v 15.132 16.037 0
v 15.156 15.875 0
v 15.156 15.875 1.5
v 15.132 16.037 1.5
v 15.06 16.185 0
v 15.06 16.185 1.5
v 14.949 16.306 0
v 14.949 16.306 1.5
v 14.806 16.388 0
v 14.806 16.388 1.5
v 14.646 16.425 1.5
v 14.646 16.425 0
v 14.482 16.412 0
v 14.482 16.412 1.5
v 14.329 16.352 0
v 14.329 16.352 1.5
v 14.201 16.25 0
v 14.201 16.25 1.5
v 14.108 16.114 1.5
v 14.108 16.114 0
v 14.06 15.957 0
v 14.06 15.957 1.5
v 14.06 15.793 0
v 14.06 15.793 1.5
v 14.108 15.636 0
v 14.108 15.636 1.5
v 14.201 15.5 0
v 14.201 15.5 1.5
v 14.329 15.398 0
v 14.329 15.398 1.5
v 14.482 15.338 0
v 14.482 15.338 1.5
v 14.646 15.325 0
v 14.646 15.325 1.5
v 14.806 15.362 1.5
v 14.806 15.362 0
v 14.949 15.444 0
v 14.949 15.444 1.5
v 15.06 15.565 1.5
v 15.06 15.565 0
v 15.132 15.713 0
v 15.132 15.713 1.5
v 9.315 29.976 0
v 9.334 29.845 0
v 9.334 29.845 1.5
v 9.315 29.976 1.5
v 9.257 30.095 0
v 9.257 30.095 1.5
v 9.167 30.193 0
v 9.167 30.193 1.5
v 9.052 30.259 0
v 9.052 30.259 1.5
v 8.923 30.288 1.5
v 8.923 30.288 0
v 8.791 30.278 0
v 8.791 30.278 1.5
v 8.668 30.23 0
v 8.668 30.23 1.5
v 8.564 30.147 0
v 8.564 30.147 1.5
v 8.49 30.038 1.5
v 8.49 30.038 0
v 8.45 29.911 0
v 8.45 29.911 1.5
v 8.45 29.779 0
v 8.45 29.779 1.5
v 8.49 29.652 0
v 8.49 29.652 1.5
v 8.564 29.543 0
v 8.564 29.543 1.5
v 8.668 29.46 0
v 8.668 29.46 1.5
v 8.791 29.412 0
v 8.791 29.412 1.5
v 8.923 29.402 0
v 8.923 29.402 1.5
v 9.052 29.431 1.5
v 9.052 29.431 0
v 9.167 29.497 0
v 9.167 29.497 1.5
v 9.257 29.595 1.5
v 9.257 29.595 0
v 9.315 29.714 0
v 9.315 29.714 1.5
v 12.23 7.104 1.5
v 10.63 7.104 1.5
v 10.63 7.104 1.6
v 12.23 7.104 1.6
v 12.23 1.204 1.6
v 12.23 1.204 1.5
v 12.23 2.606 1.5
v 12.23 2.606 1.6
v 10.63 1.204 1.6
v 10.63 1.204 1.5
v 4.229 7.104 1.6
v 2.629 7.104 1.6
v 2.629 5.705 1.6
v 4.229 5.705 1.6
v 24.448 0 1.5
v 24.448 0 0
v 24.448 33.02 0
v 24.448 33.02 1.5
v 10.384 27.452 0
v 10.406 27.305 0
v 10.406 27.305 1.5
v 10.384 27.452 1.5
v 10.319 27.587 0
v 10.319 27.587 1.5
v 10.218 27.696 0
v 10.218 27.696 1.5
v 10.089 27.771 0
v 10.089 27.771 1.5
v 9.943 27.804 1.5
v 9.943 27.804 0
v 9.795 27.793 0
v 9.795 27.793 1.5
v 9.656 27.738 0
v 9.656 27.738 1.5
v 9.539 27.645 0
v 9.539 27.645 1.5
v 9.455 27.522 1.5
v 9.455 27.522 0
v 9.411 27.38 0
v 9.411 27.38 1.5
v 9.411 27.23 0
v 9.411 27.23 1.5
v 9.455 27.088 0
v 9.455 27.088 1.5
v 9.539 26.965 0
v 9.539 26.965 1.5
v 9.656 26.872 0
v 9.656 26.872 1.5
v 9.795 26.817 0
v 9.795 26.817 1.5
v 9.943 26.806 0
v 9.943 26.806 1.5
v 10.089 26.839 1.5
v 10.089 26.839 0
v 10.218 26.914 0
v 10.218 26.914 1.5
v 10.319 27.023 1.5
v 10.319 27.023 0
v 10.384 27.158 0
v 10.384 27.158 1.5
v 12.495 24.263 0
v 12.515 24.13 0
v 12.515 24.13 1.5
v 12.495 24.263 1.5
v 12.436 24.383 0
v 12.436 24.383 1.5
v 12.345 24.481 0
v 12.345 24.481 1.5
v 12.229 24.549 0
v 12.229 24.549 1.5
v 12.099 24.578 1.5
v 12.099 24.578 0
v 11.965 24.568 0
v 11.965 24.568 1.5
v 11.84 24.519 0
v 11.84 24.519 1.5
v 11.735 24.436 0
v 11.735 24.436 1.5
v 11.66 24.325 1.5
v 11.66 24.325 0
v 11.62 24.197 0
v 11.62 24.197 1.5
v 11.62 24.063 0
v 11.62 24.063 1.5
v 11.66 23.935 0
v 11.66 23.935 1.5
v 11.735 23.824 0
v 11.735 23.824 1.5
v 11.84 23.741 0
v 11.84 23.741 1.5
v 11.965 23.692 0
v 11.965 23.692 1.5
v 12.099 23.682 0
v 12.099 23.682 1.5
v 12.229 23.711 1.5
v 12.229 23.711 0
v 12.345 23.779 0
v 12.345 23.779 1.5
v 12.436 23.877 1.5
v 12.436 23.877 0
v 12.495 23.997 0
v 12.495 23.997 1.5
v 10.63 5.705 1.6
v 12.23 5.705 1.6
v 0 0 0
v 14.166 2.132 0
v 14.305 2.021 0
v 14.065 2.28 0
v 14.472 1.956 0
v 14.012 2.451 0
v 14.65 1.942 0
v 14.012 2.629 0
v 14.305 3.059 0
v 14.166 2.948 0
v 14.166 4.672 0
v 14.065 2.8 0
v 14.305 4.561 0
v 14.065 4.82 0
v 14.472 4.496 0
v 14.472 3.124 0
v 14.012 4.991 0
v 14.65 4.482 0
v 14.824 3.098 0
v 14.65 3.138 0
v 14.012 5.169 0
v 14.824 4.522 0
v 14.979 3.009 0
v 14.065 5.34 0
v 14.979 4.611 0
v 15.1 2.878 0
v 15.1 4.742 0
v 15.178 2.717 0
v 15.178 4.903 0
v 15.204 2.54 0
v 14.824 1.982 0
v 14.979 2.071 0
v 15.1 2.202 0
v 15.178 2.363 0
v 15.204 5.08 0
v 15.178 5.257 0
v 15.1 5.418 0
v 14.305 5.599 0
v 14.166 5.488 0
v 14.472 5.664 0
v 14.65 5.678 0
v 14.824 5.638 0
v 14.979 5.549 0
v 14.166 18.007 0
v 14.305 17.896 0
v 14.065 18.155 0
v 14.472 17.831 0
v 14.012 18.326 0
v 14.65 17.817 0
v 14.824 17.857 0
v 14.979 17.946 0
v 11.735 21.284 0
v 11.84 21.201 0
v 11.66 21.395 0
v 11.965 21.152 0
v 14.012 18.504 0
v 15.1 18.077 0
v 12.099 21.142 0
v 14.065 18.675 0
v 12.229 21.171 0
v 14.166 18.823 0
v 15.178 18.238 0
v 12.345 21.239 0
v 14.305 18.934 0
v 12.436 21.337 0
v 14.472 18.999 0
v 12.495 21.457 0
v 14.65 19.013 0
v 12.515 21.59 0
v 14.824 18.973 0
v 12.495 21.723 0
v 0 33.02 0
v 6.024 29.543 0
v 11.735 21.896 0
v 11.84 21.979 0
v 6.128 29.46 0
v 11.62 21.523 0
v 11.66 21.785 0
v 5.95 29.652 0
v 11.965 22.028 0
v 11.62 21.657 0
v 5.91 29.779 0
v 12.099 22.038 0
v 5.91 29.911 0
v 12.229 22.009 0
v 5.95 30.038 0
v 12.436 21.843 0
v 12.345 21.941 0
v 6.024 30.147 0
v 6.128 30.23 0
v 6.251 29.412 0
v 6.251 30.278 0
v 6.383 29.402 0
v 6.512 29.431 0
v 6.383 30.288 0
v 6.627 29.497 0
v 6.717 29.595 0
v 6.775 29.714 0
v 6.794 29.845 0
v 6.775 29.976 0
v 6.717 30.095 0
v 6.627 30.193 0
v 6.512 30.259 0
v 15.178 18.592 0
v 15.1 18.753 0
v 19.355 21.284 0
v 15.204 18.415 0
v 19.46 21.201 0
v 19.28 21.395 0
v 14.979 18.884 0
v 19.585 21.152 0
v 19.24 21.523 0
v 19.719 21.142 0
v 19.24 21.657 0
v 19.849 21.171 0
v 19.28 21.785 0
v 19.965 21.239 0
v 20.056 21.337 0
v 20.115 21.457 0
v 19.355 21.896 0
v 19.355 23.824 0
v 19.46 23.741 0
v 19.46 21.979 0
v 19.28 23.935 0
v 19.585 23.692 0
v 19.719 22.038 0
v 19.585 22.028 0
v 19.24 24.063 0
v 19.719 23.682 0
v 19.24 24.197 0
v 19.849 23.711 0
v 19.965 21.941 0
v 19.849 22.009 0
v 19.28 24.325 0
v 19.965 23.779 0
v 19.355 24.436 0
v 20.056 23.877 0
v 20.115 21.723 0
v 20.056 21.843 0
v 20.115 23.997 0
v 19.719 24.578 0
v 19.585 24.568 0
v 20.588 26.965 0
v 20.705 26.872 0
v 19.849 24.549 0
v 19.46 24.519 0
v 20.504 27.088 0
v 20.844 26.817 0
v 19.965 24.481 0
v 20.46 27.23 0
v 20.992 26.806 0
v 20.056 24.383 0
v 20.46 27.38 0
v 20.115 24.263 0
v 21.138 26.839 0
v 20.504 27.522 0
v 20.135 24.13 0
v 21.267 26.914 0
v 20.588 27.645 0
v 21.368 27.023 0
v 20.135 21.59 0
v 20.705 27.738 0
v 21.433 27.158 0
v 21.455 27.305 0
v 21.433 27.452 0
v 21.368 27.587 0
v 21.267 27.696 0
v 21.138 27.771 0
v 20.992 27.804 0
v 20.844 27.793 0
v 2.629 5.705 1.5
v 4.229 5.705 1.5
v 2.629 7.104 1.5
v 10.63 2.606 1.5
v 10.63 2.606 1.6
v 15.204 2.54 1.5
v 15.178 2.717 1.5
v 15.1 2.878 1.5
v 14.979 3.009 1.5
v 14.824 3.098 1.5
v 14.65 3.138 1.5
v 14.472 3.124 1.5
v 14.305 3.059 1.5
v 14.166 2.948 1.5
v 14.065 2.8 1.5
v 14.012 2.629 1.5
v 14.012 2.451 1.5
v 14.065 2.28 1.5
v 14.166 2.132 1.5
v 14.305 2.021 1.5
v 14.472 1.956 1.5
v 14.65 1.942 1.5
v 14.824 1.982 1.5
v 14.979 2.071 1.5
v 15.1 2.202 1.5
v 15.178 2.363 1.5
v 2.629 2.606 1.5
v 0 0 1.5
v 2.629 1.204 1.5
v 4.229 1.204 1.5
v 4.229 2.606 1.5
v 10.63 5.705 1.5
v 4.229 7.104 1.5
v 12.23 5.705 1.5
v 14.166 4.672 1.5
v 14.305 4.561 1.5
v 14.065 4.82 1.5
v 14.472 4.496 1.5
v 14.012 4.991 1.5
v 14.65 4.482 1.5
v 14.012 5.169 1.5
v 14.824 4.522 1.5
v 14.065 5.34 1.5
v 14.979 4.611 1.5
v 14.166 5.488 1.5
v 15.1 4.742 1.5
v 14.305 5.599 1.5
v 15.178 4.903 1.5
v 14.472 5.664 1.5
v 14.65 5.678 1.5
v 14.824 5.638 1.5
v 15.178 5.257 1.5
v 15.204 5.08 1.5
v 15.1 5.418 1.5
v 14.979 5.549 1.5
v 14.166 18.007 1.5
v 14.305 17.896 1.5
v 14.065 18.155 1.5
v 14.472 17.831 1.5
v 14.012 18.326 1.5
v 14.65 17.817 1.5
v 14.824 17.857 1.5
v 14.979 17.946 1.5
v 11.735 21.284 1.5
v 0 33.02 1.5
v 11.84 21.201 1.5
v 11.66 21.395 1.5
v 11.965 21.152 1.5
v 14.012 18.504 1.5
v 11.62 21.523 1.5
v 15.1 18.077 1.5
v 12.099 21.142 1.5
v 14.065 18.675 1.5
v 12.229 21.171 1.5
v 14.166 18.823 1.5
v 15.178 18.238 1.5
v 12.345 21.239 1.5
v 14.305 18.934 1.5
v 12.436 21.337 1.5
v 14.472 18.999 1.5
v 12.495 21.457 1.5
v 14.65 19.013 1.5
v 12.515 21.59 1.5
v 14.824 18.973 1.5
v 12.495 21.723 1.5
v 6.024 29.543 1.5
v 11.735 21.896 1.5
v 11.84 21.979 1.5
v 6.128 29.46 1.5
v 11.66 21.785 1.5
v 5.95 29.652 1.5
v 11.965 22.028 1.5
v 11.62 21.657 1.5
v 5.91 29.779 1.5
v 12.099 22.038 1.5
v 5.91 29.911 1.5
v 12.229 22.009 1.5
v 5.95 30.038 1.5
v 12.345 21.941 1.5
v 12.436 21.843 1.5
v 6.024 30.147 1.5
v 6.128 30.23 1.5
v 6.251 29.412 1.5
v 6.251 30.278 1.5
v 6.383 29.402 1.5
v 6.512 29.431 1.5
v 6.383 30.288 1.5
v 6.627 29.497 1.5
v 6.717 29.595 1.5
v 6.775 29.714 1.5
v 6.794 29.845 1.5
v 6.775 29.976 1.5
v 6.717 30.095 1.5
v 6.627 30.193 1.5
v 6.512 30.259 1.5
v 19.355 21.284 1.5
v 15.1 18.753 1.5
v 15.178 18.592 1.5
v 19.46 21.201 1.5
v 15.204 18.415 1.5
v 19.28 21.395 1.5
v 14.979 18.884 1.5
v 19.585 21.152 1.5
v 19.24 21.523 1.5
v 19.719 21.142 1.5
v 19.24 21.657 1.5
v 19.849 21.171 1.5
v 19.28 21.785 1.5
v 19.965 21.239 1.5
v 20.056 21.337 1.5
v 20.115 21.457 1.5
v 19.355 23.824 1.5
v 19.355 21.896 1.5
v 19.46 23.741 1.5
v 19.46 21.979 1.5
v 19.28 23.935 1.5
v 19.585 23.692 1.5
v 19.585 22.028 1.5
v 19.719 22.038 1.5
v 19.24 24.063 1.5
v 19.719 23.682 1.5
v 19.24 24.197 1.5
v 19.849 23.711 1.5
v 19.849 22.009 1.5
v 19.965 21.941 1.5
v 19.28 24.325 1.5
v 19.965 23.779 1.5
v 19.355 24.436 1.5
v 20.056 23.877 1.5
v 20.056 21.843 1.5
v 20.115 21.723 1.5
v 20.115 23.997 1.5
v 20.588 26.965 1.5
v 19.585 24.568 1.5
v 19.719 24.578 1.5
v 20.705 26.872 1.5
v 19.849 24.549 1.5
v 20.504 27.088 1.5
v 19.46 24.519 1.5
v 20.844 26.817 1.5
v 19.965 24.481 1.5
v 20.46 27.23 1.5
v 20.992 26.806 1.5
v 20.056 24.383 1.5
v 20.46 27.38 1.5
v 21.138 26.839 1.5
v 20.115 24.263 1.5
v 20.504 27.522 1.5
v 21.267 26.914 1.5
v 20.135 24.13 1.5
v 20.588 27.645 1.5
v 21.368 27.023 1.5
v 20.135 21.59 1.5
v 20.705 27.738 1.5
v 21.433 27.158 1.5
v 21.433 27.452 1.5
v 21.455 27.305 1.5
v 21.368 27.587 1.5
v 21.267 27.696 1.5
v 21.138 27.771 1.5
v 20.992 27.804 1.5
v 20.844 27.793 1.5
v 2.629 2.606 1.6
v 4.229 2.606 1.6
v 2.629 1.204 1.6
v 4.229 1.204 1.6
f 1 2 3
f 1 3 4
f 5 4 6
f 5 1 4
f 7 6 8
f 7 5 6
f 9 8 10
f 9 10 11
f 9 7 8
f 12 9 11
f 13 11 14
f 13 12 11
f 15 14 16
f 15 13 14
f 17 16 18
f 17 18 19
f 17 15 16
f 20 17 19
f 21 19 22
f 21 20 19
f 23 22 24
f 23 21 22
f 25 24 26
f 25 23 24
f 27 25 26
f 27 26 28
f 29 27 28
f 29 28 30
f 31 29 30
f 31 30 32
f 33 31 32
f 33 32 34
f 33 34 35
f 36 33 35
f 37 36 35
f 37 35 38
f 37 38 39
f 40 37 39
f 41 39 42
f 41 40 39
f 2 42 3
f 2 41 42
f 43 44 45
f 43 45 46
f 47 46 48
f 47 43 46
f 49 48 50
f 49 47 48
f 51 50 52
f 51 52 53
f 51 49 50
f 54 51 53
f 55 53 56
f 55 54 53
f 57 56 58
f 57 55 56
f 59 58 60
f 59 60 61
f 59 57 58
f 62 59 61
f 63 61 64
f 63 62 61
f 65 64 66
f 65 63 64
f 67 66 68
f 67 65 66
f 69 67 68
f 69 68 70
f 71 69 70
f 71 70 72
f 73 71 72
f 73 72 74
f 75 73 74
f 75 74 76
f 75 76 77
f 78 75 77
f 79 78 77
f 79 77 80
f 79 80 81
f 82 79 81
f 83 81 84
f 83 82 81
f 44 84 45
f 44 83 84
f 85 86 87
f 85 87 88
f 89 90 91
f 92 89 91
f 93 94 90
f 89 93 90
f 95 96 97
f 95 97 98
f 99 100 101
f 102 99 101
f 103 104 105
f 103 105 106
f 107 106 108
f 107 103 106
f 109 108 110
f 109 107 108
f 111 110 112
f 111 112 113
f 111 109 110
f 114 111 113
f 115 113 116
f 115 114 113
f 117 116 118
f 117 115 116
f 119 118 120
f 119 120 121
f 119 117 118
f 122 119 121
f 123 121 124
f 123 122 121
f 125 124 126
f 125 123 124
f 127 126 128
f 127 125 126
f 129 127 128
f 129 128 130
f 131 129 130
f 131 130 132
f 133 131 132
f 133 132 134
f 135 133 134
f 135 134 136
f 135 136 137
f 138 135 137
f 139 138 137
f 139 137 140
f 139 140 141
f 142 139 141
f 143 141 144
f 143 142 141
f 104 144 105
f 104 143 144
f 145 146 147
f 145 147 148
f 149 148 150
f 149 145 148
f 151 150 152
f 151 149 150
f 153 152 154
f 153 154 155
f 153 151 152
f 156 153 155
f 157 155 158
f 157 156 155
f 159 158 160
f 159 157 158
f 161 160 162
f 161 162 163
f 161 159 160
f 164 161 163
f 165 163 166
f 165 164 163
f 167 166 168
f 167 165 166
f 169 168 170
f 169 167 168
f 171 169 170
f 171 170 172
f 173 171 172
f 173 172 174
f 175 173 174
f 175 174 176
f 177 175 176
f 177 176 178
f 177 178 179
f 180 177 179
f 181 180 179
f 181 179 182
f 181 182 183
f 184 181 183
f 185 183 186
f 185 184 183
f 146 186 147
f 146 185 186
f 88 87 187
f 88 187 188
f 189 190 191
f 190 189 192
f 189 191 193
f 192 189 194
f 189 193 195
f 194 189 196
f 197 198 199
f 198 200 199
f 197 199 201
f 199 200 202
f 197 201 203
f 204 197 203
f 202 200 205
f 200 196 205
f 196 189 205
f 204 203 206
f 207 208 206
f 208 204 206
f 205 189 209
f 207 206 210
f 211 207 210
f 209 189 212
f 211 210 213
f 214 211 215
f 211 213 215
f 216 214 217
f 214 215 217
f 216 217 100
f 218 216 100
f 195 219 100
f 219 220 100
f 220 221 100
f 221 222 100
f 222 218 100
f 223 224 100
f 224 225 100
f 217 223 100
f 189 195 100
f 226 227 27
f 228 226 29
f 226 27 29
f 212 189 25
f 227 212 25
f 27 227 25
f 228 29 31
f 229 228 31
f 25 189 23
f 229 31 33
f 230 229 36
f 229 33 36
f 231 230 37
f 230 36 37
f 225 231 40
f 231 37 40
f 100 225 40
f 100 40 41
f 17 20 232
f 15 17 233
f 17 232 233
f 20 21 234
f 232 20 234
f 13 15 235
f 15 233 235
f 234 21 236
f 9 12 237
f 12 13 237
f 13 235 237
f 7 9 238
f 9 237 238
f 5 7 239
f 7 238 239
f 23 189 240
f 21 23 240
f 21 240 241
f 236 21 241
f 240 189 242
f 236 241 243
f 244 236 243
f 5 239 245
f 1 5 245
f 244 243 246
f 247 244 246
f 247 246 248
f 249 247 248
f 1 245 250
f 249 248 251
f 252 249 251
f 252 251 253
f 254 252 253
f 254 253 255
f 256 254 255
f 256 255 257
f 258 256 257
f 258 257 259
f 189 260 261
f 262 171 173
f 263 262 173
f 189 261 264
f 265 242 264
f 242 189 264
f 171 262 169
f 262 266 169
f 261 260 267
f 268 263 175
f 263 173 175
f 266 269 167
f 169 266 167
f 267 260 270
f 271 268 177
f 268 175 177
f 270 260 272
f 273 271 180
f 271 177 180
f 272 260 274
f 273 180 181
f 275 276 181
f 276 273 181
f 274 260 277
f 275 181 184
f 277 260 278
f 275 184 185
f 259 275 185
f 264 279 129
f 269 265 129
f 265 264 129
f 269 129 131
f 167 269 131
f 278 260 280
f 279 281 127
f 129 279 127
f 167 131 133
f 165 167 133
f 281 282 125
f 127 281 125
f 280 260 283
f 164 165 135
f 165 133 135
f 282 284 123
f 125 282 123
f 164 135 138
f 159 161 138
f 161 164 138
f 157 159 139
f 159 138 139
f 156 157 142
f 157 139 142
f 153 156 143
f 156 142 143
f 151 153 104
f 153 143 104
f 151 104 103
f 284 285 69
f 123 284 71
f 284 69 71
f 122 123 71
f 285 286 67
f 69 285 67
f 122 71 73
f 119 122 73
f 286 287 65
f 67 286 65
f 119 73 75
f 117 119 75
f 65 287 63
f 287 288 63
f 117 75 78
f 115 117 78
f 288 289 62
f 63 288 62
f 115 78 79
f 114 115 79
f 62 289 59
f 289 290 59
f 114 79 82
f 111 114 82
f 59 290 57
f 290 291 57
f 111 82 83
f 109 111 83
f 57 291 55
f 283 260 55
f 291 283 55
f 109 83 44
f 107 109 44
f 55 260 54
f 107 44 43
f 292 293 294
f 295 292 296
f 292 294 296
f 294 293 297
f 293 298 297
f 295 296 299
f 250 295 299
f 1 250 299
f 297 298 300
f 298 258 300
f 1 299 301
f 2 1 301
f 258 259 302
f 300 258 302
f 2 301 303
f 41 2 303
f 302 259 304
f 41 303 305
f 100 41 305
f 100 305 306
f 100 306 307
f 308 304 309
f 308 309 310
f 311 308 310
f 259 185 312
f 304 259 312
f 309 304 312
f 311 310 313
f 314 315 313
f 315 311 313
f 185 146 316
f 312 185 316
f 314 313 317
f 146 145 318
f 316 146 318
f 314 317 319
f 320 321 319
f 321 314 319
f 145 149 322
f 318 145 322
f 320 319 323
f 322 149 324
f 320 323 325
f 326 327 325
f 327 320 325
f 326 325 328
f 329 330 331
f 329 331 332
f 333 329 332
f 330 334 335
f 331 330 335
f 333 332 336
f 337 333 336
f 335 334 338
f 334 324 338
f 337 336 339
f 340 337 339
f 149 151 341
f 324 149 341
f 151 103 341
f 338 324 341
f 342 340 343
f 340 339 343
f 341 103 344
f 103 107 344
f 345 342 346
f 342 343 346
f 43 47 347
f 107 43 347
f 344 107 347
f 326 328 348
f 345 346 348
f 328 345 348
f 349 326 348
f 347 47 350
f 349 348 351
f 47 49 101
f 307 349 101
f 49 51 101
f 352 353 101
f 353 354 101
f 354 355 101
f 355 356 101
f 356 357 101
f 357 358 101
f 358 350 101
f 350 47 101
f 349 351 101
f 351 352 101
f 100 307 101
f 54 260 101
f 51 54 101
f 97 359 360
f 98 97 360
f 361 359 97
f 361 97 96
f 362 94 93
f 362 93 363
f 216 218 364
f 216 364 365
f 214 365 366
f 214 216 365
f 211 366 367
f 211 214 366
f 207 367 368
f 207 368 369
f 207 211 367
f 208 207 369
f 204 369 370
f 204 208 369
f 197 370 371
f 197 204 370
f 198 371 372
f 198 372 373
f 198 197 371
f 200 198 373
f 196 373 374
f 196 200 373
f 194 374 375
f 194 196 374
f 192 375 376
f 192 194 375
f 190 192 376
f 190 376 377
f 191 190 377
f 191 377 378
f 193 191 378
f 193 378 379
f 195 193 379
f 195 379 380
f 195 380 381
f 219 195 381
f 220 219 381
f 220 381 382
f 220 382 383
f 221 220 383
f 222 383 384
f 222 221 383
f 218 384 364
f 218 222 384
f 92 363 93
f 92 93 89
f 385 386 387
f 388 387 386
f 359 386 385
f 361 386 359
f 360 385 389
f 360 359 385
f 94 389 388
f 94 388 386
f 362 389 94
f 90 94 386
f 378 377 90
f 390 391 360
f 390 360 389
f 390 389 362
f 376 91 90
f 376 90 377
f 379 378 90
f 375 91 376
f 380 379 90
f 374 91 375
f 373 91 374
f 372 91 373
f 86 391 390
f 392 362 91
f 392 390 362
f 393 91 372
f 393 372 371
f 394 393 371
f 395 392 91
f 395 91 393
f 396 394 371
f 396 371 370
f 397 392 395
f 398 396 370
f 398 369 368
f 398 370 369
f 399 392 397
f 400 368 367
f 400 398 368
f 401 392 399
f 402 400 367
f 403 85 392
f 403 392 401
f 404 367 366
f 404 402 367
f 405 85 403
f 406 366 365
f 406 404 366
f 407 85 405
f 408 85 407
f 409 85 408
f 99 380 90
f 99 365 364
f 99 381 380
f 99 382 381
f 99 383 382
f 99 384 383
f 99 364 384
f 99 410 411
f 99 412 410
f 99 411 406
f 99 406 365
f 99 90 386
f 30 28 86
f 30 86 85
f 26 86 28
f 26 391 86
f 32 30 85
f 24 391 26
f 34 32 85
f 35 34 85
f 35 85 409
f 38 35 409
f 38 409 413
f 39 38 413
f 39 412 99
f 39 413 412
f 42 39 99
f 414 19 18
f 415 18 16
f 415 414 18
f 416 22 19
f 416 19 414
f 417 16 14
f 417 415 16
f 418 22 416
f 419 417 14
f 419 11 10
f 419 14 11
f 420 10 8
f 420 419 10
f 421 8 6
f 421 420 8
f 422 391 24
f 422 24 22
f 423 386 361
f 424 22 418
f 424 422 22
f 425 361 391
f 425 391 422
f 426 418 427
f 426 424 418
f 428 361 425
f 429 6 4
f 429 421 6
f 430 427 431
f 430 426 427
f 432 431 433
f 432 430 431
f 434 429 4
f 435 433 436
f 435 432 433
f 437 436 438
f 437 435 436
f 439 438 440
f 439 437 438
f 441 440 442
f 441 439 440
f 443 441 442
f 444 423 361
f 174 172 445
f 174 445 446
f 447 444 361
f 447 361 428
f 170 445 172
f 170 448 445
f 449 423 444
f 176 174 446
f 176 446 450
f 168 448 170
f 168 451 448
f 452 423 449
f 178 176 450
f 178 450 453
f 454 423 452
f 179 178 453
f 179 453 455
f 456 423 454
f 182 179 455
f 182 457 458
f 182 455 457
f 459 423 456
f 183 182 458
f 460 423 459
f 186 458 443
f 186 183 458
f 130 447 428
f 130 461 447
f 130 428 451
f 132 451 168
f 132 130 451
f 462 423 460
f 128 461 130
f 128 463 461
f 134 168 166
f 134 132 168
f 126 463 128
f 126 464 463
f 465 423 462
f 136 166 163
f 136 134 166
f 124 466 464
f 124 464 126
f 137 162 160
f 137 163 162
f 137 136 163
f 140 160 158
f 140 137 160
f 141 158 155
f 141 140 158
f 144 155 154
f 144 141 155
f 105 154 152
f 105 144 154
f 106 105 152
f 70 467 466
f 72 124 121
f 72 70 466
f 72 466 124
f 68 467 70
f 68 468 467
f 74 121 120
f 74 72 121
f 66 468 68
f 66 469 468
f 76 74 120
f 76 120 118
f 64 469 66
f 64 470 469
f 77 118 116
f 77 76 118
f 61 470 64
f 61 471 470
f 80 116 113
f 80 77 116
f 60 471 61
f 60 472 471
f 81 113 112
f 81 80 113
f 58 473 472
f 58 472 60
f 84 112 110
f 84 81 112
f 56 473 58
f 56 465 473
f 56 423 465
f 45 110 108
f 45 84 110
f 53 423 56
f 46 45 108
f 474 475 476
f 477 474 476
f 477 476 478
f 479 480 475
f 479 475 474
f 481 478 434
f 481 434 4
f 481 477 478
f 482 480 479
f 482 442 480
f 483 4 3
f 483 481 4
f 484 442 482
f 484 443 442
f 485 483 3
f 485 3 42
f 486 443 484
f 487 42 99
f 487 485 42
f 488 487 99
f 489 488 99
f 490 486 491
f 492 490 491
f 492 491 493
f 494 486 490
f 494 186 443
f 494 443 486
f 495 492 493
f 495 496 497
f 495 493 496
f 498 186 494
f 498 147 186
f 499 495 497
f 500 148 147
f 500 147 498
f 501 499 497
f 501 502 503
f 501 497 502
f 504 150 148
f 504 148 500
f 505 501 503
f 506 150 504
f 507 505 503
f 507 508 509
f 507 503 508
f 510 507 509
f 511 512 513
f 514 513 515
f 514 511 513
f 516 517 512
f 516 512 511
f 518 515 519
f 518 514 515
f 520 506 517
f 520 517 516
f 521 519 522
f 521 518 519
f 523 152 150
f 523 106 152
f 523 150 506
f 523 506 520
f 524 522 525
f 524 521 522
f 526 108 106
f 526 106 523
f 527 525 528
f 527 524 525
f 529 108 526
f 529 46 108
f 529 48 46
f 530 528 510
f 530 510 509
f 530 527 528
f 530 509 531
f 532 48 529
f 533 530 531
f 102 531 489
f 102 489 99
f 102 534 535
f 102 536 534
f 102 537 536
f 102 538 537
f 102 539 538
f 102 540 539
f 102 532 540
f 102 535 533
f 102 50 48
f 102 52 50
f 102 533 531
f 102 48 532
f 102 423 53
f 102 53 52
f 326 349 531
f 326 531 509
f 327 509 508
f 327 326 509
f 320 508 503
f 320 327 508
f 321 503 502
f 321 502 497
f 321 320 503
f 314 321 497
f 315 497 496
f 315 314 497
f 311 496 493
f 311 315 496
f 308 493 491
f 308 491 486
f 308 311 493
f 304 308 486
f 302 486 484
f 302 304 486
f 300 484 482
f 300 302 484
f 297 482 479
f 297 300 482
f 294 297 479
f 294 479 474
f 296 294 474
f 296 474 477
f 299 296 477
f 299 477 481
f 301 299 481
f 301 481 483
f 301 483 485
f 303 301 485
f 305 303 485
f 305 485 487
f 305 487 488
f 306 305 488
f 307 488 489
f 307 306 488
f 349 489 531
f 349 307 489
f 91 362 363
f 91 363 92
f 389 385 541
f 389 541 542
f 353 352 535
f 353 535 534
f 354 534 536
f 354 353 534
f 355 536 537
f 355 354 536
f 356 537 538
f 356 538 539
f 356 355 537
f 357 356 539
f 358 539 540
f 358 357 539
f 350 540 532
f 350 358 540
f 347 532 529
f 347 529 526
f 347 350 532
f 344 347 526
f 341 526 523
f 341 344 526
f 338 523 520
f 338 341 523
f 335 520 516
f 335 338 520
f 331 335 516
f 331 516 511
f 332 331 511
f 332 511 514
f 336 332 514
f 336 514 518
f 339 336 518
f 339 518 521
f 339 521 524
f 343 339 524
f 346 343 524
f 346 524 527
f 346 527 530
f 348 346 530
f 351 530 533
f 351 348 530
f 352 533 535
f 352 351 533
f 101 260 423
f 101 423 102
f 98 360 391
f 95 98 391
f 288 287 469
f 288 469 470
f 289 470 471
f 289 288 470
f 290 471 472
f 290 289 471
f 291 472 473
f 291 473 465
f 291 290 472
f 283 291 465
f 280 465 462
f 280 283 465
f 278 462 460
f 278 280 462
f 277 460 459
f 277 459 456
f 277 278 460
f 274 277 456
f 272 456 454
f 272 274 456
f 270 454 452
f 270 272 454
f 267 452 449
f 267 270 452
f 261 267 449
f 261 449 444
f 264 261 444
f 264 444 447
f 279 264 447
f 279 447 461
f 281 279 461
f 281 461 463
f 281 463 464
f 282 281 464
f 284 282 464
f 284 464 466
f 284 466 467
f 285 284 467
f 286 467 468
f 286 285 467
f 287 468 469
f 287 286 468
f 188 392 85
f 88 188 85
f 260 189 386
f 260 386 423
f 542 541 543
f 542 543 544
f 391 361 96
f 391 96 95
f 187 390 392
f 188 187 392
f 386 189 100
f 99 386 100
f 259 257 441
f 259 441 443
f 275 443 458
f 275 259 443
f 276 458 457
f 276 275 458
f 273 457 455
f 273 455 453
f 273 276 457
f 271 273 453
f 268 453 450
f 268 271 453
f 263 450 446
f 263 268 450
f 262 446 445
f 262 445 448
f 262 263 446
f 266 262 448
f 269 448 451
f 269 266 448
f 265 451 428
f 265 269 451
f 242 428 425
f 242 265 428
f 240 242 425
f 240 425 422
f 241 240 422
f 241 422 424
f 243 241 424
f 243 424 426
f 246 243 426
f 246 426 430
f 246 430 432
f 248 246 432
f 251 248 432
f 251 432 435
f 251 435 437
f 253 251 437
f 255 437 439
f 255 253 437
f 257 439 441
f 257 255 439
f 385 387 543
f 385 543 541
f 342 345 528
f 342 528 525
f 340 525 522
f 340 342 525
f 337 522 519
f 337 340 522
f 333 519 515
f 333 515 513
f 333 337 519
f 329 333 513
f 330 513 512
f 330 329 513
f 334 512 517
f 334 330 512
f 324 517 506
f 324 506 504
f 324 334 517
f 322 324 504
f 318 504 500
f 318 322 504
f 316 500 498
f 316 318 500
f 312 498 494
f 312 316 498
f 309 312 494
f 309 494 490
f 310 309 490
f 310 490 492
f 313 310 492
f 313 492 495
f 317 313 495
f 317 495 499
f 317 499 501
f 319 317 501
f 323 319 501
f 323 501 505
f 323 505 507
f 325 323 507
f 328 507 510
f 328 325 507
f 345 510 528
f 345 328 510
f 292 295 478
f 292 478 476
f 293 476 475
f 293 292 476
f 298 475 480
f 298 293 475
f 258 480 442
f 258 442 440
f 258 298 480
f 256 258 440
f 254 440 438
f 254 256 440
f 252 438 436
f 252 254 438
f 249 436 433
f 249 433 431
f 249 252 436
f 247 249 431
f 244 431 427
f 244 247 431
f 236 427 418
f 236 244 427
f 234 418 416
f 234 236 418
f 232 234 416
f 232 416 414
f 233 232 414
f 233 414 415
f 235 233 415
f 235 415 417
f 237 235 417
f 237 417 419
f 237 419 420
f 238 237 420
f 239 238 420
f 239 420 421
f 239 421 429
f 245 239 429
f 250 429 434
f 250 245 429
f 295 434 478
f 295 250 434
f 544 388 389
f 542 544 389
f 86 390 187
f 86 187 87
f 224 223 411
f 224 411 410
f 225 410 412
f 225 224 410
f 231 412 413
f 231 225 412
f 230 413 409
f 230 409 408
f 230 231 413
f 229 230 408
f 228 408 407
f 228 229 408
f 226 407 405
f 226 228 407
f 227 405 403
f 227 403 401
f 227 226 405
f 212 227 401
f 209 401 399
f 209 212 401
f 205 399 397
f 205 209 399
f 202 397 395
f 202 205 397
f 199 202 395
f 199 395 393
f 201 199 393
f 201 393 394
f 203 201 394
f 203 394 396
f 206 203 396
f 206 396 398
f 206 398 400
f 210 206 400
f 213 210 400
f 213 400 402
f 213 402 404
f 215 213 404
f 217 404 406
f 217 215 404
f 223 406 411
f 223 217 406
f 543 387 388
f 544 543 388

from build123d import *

# Parameters (mm, degrees)
SKETCH_1_W            = 24.4475
SKETCH_1_H            = 33.02
SKETCH_1_R            = 0.44958
SKETCH_1_R_2          = 0.55118
SKETCH_1_R_3          = 0.59944
SKETCH_1_R_4          = 0.50038
SKETCH_1_R_5          = 0.4445
EXTRUDE_1_DEPTH       = 1.5
EXTRUDE_2_OUTLINE_W   = 1.6002
EXTRUDE_2_OUTLINE_H   = 1.40208
EXTRUDE_2_OUTLINE_H_2 = 1.39954
EXTRUDE_2_DEPTH       = 0.1


# Read off the part's stored shape, not the designer's step: Бобышка-Вытянуть2
with BuildPart() as part:
    # Эскиз1 → Бобышка-Вытянуть1 (new body)
    with BuildSketch(Plane.XY):
        with Locations((12.22375, 16.51)):
            Rectangle(SKETCH_1_W, SKETCH_1_H)
        with Locations((19.685, 21.59)):
            Circle(SKETCH_1_R, mode=Mode.SUBTRACT)
        with Locations((19.685, 24.13)):
            Circle(SKETCH_1_R, mode=Mode.SUBTRACT)
        with Locations((12.065, 24.13)):
            Circle(SKETCH_1_R, mode=Mode.SUBTRACT)
        with Locations((12.065, 21.59)):
            Circle(SKETCH_1_R, mode=Mode.SUBTRACT)
        with Locations((14.605, 15.875)):
            Circle(SKETCH_1_R_2, mode=Mode.SUBTRACT)
        with Locations((14.605, 18.415)):
            Circle(SKETCH_1_R_3, mode=Mode.SUBTRACT)
        with Locations((14.605, 2.54)):
            Circle(SKETCH_1_R_3, mode=Mode.SUBTRACT)
        with Locations((14.605, 5.08)):
            Circle(SKETCH_1_R_3, mode=Mode.SUBTRACT)
        with Locations((9.906, 27.305)):
            Circle(SKETCH_1_R_4, mode=Mode.SUBTRACT)
        with Locations((20.955, 27.305)):
            Circle(SKETCH_1_R_4, mode=Mode.SUBTRACT)
        with Locations((8.89, 29.845)):
            Circle(SKETCH_1_R_5, mode=Mode.SUBTRACT)
        with Locations((6.35, 29.845)):
            Circle(SKETCH_1_R_5, mode=Mode.SUBTRACT)
    extrude(amount=EXTRUDE_1_DEPTH)

    # Бобышка-Вытянуть2 outline → Бобышка-Вытянуть2 (add)
    with BuildSketch(Plane.XY.offset(1.5)):
        with Locations((3.429, 1.905)):
            Rectangle(EXTRUDE_2_OUTLINE_W, EXTRUDE_2_OUTLINE_H)
        with Locations((3.429, 6.40461)):
            Rectangle(EXTRUDE_2_OUTLINE_W, EXTRUDE_2_OUTLINE_H_2)
        with Locations((11.43, 1.905)):
            Rectangle(EXTRUDE_2_OUTLINE_W, EXTRUDE_2_OUTLINE_H)
        with Locations((11.43, 6.40461)):
            Rectangle(EXTRUDE_2_OUTLINE_W, EXTRUDE_2_OUTLINE_H_2)
    extrude(amount=EXTRUDE_2_DEPTH)


solid = part.part
